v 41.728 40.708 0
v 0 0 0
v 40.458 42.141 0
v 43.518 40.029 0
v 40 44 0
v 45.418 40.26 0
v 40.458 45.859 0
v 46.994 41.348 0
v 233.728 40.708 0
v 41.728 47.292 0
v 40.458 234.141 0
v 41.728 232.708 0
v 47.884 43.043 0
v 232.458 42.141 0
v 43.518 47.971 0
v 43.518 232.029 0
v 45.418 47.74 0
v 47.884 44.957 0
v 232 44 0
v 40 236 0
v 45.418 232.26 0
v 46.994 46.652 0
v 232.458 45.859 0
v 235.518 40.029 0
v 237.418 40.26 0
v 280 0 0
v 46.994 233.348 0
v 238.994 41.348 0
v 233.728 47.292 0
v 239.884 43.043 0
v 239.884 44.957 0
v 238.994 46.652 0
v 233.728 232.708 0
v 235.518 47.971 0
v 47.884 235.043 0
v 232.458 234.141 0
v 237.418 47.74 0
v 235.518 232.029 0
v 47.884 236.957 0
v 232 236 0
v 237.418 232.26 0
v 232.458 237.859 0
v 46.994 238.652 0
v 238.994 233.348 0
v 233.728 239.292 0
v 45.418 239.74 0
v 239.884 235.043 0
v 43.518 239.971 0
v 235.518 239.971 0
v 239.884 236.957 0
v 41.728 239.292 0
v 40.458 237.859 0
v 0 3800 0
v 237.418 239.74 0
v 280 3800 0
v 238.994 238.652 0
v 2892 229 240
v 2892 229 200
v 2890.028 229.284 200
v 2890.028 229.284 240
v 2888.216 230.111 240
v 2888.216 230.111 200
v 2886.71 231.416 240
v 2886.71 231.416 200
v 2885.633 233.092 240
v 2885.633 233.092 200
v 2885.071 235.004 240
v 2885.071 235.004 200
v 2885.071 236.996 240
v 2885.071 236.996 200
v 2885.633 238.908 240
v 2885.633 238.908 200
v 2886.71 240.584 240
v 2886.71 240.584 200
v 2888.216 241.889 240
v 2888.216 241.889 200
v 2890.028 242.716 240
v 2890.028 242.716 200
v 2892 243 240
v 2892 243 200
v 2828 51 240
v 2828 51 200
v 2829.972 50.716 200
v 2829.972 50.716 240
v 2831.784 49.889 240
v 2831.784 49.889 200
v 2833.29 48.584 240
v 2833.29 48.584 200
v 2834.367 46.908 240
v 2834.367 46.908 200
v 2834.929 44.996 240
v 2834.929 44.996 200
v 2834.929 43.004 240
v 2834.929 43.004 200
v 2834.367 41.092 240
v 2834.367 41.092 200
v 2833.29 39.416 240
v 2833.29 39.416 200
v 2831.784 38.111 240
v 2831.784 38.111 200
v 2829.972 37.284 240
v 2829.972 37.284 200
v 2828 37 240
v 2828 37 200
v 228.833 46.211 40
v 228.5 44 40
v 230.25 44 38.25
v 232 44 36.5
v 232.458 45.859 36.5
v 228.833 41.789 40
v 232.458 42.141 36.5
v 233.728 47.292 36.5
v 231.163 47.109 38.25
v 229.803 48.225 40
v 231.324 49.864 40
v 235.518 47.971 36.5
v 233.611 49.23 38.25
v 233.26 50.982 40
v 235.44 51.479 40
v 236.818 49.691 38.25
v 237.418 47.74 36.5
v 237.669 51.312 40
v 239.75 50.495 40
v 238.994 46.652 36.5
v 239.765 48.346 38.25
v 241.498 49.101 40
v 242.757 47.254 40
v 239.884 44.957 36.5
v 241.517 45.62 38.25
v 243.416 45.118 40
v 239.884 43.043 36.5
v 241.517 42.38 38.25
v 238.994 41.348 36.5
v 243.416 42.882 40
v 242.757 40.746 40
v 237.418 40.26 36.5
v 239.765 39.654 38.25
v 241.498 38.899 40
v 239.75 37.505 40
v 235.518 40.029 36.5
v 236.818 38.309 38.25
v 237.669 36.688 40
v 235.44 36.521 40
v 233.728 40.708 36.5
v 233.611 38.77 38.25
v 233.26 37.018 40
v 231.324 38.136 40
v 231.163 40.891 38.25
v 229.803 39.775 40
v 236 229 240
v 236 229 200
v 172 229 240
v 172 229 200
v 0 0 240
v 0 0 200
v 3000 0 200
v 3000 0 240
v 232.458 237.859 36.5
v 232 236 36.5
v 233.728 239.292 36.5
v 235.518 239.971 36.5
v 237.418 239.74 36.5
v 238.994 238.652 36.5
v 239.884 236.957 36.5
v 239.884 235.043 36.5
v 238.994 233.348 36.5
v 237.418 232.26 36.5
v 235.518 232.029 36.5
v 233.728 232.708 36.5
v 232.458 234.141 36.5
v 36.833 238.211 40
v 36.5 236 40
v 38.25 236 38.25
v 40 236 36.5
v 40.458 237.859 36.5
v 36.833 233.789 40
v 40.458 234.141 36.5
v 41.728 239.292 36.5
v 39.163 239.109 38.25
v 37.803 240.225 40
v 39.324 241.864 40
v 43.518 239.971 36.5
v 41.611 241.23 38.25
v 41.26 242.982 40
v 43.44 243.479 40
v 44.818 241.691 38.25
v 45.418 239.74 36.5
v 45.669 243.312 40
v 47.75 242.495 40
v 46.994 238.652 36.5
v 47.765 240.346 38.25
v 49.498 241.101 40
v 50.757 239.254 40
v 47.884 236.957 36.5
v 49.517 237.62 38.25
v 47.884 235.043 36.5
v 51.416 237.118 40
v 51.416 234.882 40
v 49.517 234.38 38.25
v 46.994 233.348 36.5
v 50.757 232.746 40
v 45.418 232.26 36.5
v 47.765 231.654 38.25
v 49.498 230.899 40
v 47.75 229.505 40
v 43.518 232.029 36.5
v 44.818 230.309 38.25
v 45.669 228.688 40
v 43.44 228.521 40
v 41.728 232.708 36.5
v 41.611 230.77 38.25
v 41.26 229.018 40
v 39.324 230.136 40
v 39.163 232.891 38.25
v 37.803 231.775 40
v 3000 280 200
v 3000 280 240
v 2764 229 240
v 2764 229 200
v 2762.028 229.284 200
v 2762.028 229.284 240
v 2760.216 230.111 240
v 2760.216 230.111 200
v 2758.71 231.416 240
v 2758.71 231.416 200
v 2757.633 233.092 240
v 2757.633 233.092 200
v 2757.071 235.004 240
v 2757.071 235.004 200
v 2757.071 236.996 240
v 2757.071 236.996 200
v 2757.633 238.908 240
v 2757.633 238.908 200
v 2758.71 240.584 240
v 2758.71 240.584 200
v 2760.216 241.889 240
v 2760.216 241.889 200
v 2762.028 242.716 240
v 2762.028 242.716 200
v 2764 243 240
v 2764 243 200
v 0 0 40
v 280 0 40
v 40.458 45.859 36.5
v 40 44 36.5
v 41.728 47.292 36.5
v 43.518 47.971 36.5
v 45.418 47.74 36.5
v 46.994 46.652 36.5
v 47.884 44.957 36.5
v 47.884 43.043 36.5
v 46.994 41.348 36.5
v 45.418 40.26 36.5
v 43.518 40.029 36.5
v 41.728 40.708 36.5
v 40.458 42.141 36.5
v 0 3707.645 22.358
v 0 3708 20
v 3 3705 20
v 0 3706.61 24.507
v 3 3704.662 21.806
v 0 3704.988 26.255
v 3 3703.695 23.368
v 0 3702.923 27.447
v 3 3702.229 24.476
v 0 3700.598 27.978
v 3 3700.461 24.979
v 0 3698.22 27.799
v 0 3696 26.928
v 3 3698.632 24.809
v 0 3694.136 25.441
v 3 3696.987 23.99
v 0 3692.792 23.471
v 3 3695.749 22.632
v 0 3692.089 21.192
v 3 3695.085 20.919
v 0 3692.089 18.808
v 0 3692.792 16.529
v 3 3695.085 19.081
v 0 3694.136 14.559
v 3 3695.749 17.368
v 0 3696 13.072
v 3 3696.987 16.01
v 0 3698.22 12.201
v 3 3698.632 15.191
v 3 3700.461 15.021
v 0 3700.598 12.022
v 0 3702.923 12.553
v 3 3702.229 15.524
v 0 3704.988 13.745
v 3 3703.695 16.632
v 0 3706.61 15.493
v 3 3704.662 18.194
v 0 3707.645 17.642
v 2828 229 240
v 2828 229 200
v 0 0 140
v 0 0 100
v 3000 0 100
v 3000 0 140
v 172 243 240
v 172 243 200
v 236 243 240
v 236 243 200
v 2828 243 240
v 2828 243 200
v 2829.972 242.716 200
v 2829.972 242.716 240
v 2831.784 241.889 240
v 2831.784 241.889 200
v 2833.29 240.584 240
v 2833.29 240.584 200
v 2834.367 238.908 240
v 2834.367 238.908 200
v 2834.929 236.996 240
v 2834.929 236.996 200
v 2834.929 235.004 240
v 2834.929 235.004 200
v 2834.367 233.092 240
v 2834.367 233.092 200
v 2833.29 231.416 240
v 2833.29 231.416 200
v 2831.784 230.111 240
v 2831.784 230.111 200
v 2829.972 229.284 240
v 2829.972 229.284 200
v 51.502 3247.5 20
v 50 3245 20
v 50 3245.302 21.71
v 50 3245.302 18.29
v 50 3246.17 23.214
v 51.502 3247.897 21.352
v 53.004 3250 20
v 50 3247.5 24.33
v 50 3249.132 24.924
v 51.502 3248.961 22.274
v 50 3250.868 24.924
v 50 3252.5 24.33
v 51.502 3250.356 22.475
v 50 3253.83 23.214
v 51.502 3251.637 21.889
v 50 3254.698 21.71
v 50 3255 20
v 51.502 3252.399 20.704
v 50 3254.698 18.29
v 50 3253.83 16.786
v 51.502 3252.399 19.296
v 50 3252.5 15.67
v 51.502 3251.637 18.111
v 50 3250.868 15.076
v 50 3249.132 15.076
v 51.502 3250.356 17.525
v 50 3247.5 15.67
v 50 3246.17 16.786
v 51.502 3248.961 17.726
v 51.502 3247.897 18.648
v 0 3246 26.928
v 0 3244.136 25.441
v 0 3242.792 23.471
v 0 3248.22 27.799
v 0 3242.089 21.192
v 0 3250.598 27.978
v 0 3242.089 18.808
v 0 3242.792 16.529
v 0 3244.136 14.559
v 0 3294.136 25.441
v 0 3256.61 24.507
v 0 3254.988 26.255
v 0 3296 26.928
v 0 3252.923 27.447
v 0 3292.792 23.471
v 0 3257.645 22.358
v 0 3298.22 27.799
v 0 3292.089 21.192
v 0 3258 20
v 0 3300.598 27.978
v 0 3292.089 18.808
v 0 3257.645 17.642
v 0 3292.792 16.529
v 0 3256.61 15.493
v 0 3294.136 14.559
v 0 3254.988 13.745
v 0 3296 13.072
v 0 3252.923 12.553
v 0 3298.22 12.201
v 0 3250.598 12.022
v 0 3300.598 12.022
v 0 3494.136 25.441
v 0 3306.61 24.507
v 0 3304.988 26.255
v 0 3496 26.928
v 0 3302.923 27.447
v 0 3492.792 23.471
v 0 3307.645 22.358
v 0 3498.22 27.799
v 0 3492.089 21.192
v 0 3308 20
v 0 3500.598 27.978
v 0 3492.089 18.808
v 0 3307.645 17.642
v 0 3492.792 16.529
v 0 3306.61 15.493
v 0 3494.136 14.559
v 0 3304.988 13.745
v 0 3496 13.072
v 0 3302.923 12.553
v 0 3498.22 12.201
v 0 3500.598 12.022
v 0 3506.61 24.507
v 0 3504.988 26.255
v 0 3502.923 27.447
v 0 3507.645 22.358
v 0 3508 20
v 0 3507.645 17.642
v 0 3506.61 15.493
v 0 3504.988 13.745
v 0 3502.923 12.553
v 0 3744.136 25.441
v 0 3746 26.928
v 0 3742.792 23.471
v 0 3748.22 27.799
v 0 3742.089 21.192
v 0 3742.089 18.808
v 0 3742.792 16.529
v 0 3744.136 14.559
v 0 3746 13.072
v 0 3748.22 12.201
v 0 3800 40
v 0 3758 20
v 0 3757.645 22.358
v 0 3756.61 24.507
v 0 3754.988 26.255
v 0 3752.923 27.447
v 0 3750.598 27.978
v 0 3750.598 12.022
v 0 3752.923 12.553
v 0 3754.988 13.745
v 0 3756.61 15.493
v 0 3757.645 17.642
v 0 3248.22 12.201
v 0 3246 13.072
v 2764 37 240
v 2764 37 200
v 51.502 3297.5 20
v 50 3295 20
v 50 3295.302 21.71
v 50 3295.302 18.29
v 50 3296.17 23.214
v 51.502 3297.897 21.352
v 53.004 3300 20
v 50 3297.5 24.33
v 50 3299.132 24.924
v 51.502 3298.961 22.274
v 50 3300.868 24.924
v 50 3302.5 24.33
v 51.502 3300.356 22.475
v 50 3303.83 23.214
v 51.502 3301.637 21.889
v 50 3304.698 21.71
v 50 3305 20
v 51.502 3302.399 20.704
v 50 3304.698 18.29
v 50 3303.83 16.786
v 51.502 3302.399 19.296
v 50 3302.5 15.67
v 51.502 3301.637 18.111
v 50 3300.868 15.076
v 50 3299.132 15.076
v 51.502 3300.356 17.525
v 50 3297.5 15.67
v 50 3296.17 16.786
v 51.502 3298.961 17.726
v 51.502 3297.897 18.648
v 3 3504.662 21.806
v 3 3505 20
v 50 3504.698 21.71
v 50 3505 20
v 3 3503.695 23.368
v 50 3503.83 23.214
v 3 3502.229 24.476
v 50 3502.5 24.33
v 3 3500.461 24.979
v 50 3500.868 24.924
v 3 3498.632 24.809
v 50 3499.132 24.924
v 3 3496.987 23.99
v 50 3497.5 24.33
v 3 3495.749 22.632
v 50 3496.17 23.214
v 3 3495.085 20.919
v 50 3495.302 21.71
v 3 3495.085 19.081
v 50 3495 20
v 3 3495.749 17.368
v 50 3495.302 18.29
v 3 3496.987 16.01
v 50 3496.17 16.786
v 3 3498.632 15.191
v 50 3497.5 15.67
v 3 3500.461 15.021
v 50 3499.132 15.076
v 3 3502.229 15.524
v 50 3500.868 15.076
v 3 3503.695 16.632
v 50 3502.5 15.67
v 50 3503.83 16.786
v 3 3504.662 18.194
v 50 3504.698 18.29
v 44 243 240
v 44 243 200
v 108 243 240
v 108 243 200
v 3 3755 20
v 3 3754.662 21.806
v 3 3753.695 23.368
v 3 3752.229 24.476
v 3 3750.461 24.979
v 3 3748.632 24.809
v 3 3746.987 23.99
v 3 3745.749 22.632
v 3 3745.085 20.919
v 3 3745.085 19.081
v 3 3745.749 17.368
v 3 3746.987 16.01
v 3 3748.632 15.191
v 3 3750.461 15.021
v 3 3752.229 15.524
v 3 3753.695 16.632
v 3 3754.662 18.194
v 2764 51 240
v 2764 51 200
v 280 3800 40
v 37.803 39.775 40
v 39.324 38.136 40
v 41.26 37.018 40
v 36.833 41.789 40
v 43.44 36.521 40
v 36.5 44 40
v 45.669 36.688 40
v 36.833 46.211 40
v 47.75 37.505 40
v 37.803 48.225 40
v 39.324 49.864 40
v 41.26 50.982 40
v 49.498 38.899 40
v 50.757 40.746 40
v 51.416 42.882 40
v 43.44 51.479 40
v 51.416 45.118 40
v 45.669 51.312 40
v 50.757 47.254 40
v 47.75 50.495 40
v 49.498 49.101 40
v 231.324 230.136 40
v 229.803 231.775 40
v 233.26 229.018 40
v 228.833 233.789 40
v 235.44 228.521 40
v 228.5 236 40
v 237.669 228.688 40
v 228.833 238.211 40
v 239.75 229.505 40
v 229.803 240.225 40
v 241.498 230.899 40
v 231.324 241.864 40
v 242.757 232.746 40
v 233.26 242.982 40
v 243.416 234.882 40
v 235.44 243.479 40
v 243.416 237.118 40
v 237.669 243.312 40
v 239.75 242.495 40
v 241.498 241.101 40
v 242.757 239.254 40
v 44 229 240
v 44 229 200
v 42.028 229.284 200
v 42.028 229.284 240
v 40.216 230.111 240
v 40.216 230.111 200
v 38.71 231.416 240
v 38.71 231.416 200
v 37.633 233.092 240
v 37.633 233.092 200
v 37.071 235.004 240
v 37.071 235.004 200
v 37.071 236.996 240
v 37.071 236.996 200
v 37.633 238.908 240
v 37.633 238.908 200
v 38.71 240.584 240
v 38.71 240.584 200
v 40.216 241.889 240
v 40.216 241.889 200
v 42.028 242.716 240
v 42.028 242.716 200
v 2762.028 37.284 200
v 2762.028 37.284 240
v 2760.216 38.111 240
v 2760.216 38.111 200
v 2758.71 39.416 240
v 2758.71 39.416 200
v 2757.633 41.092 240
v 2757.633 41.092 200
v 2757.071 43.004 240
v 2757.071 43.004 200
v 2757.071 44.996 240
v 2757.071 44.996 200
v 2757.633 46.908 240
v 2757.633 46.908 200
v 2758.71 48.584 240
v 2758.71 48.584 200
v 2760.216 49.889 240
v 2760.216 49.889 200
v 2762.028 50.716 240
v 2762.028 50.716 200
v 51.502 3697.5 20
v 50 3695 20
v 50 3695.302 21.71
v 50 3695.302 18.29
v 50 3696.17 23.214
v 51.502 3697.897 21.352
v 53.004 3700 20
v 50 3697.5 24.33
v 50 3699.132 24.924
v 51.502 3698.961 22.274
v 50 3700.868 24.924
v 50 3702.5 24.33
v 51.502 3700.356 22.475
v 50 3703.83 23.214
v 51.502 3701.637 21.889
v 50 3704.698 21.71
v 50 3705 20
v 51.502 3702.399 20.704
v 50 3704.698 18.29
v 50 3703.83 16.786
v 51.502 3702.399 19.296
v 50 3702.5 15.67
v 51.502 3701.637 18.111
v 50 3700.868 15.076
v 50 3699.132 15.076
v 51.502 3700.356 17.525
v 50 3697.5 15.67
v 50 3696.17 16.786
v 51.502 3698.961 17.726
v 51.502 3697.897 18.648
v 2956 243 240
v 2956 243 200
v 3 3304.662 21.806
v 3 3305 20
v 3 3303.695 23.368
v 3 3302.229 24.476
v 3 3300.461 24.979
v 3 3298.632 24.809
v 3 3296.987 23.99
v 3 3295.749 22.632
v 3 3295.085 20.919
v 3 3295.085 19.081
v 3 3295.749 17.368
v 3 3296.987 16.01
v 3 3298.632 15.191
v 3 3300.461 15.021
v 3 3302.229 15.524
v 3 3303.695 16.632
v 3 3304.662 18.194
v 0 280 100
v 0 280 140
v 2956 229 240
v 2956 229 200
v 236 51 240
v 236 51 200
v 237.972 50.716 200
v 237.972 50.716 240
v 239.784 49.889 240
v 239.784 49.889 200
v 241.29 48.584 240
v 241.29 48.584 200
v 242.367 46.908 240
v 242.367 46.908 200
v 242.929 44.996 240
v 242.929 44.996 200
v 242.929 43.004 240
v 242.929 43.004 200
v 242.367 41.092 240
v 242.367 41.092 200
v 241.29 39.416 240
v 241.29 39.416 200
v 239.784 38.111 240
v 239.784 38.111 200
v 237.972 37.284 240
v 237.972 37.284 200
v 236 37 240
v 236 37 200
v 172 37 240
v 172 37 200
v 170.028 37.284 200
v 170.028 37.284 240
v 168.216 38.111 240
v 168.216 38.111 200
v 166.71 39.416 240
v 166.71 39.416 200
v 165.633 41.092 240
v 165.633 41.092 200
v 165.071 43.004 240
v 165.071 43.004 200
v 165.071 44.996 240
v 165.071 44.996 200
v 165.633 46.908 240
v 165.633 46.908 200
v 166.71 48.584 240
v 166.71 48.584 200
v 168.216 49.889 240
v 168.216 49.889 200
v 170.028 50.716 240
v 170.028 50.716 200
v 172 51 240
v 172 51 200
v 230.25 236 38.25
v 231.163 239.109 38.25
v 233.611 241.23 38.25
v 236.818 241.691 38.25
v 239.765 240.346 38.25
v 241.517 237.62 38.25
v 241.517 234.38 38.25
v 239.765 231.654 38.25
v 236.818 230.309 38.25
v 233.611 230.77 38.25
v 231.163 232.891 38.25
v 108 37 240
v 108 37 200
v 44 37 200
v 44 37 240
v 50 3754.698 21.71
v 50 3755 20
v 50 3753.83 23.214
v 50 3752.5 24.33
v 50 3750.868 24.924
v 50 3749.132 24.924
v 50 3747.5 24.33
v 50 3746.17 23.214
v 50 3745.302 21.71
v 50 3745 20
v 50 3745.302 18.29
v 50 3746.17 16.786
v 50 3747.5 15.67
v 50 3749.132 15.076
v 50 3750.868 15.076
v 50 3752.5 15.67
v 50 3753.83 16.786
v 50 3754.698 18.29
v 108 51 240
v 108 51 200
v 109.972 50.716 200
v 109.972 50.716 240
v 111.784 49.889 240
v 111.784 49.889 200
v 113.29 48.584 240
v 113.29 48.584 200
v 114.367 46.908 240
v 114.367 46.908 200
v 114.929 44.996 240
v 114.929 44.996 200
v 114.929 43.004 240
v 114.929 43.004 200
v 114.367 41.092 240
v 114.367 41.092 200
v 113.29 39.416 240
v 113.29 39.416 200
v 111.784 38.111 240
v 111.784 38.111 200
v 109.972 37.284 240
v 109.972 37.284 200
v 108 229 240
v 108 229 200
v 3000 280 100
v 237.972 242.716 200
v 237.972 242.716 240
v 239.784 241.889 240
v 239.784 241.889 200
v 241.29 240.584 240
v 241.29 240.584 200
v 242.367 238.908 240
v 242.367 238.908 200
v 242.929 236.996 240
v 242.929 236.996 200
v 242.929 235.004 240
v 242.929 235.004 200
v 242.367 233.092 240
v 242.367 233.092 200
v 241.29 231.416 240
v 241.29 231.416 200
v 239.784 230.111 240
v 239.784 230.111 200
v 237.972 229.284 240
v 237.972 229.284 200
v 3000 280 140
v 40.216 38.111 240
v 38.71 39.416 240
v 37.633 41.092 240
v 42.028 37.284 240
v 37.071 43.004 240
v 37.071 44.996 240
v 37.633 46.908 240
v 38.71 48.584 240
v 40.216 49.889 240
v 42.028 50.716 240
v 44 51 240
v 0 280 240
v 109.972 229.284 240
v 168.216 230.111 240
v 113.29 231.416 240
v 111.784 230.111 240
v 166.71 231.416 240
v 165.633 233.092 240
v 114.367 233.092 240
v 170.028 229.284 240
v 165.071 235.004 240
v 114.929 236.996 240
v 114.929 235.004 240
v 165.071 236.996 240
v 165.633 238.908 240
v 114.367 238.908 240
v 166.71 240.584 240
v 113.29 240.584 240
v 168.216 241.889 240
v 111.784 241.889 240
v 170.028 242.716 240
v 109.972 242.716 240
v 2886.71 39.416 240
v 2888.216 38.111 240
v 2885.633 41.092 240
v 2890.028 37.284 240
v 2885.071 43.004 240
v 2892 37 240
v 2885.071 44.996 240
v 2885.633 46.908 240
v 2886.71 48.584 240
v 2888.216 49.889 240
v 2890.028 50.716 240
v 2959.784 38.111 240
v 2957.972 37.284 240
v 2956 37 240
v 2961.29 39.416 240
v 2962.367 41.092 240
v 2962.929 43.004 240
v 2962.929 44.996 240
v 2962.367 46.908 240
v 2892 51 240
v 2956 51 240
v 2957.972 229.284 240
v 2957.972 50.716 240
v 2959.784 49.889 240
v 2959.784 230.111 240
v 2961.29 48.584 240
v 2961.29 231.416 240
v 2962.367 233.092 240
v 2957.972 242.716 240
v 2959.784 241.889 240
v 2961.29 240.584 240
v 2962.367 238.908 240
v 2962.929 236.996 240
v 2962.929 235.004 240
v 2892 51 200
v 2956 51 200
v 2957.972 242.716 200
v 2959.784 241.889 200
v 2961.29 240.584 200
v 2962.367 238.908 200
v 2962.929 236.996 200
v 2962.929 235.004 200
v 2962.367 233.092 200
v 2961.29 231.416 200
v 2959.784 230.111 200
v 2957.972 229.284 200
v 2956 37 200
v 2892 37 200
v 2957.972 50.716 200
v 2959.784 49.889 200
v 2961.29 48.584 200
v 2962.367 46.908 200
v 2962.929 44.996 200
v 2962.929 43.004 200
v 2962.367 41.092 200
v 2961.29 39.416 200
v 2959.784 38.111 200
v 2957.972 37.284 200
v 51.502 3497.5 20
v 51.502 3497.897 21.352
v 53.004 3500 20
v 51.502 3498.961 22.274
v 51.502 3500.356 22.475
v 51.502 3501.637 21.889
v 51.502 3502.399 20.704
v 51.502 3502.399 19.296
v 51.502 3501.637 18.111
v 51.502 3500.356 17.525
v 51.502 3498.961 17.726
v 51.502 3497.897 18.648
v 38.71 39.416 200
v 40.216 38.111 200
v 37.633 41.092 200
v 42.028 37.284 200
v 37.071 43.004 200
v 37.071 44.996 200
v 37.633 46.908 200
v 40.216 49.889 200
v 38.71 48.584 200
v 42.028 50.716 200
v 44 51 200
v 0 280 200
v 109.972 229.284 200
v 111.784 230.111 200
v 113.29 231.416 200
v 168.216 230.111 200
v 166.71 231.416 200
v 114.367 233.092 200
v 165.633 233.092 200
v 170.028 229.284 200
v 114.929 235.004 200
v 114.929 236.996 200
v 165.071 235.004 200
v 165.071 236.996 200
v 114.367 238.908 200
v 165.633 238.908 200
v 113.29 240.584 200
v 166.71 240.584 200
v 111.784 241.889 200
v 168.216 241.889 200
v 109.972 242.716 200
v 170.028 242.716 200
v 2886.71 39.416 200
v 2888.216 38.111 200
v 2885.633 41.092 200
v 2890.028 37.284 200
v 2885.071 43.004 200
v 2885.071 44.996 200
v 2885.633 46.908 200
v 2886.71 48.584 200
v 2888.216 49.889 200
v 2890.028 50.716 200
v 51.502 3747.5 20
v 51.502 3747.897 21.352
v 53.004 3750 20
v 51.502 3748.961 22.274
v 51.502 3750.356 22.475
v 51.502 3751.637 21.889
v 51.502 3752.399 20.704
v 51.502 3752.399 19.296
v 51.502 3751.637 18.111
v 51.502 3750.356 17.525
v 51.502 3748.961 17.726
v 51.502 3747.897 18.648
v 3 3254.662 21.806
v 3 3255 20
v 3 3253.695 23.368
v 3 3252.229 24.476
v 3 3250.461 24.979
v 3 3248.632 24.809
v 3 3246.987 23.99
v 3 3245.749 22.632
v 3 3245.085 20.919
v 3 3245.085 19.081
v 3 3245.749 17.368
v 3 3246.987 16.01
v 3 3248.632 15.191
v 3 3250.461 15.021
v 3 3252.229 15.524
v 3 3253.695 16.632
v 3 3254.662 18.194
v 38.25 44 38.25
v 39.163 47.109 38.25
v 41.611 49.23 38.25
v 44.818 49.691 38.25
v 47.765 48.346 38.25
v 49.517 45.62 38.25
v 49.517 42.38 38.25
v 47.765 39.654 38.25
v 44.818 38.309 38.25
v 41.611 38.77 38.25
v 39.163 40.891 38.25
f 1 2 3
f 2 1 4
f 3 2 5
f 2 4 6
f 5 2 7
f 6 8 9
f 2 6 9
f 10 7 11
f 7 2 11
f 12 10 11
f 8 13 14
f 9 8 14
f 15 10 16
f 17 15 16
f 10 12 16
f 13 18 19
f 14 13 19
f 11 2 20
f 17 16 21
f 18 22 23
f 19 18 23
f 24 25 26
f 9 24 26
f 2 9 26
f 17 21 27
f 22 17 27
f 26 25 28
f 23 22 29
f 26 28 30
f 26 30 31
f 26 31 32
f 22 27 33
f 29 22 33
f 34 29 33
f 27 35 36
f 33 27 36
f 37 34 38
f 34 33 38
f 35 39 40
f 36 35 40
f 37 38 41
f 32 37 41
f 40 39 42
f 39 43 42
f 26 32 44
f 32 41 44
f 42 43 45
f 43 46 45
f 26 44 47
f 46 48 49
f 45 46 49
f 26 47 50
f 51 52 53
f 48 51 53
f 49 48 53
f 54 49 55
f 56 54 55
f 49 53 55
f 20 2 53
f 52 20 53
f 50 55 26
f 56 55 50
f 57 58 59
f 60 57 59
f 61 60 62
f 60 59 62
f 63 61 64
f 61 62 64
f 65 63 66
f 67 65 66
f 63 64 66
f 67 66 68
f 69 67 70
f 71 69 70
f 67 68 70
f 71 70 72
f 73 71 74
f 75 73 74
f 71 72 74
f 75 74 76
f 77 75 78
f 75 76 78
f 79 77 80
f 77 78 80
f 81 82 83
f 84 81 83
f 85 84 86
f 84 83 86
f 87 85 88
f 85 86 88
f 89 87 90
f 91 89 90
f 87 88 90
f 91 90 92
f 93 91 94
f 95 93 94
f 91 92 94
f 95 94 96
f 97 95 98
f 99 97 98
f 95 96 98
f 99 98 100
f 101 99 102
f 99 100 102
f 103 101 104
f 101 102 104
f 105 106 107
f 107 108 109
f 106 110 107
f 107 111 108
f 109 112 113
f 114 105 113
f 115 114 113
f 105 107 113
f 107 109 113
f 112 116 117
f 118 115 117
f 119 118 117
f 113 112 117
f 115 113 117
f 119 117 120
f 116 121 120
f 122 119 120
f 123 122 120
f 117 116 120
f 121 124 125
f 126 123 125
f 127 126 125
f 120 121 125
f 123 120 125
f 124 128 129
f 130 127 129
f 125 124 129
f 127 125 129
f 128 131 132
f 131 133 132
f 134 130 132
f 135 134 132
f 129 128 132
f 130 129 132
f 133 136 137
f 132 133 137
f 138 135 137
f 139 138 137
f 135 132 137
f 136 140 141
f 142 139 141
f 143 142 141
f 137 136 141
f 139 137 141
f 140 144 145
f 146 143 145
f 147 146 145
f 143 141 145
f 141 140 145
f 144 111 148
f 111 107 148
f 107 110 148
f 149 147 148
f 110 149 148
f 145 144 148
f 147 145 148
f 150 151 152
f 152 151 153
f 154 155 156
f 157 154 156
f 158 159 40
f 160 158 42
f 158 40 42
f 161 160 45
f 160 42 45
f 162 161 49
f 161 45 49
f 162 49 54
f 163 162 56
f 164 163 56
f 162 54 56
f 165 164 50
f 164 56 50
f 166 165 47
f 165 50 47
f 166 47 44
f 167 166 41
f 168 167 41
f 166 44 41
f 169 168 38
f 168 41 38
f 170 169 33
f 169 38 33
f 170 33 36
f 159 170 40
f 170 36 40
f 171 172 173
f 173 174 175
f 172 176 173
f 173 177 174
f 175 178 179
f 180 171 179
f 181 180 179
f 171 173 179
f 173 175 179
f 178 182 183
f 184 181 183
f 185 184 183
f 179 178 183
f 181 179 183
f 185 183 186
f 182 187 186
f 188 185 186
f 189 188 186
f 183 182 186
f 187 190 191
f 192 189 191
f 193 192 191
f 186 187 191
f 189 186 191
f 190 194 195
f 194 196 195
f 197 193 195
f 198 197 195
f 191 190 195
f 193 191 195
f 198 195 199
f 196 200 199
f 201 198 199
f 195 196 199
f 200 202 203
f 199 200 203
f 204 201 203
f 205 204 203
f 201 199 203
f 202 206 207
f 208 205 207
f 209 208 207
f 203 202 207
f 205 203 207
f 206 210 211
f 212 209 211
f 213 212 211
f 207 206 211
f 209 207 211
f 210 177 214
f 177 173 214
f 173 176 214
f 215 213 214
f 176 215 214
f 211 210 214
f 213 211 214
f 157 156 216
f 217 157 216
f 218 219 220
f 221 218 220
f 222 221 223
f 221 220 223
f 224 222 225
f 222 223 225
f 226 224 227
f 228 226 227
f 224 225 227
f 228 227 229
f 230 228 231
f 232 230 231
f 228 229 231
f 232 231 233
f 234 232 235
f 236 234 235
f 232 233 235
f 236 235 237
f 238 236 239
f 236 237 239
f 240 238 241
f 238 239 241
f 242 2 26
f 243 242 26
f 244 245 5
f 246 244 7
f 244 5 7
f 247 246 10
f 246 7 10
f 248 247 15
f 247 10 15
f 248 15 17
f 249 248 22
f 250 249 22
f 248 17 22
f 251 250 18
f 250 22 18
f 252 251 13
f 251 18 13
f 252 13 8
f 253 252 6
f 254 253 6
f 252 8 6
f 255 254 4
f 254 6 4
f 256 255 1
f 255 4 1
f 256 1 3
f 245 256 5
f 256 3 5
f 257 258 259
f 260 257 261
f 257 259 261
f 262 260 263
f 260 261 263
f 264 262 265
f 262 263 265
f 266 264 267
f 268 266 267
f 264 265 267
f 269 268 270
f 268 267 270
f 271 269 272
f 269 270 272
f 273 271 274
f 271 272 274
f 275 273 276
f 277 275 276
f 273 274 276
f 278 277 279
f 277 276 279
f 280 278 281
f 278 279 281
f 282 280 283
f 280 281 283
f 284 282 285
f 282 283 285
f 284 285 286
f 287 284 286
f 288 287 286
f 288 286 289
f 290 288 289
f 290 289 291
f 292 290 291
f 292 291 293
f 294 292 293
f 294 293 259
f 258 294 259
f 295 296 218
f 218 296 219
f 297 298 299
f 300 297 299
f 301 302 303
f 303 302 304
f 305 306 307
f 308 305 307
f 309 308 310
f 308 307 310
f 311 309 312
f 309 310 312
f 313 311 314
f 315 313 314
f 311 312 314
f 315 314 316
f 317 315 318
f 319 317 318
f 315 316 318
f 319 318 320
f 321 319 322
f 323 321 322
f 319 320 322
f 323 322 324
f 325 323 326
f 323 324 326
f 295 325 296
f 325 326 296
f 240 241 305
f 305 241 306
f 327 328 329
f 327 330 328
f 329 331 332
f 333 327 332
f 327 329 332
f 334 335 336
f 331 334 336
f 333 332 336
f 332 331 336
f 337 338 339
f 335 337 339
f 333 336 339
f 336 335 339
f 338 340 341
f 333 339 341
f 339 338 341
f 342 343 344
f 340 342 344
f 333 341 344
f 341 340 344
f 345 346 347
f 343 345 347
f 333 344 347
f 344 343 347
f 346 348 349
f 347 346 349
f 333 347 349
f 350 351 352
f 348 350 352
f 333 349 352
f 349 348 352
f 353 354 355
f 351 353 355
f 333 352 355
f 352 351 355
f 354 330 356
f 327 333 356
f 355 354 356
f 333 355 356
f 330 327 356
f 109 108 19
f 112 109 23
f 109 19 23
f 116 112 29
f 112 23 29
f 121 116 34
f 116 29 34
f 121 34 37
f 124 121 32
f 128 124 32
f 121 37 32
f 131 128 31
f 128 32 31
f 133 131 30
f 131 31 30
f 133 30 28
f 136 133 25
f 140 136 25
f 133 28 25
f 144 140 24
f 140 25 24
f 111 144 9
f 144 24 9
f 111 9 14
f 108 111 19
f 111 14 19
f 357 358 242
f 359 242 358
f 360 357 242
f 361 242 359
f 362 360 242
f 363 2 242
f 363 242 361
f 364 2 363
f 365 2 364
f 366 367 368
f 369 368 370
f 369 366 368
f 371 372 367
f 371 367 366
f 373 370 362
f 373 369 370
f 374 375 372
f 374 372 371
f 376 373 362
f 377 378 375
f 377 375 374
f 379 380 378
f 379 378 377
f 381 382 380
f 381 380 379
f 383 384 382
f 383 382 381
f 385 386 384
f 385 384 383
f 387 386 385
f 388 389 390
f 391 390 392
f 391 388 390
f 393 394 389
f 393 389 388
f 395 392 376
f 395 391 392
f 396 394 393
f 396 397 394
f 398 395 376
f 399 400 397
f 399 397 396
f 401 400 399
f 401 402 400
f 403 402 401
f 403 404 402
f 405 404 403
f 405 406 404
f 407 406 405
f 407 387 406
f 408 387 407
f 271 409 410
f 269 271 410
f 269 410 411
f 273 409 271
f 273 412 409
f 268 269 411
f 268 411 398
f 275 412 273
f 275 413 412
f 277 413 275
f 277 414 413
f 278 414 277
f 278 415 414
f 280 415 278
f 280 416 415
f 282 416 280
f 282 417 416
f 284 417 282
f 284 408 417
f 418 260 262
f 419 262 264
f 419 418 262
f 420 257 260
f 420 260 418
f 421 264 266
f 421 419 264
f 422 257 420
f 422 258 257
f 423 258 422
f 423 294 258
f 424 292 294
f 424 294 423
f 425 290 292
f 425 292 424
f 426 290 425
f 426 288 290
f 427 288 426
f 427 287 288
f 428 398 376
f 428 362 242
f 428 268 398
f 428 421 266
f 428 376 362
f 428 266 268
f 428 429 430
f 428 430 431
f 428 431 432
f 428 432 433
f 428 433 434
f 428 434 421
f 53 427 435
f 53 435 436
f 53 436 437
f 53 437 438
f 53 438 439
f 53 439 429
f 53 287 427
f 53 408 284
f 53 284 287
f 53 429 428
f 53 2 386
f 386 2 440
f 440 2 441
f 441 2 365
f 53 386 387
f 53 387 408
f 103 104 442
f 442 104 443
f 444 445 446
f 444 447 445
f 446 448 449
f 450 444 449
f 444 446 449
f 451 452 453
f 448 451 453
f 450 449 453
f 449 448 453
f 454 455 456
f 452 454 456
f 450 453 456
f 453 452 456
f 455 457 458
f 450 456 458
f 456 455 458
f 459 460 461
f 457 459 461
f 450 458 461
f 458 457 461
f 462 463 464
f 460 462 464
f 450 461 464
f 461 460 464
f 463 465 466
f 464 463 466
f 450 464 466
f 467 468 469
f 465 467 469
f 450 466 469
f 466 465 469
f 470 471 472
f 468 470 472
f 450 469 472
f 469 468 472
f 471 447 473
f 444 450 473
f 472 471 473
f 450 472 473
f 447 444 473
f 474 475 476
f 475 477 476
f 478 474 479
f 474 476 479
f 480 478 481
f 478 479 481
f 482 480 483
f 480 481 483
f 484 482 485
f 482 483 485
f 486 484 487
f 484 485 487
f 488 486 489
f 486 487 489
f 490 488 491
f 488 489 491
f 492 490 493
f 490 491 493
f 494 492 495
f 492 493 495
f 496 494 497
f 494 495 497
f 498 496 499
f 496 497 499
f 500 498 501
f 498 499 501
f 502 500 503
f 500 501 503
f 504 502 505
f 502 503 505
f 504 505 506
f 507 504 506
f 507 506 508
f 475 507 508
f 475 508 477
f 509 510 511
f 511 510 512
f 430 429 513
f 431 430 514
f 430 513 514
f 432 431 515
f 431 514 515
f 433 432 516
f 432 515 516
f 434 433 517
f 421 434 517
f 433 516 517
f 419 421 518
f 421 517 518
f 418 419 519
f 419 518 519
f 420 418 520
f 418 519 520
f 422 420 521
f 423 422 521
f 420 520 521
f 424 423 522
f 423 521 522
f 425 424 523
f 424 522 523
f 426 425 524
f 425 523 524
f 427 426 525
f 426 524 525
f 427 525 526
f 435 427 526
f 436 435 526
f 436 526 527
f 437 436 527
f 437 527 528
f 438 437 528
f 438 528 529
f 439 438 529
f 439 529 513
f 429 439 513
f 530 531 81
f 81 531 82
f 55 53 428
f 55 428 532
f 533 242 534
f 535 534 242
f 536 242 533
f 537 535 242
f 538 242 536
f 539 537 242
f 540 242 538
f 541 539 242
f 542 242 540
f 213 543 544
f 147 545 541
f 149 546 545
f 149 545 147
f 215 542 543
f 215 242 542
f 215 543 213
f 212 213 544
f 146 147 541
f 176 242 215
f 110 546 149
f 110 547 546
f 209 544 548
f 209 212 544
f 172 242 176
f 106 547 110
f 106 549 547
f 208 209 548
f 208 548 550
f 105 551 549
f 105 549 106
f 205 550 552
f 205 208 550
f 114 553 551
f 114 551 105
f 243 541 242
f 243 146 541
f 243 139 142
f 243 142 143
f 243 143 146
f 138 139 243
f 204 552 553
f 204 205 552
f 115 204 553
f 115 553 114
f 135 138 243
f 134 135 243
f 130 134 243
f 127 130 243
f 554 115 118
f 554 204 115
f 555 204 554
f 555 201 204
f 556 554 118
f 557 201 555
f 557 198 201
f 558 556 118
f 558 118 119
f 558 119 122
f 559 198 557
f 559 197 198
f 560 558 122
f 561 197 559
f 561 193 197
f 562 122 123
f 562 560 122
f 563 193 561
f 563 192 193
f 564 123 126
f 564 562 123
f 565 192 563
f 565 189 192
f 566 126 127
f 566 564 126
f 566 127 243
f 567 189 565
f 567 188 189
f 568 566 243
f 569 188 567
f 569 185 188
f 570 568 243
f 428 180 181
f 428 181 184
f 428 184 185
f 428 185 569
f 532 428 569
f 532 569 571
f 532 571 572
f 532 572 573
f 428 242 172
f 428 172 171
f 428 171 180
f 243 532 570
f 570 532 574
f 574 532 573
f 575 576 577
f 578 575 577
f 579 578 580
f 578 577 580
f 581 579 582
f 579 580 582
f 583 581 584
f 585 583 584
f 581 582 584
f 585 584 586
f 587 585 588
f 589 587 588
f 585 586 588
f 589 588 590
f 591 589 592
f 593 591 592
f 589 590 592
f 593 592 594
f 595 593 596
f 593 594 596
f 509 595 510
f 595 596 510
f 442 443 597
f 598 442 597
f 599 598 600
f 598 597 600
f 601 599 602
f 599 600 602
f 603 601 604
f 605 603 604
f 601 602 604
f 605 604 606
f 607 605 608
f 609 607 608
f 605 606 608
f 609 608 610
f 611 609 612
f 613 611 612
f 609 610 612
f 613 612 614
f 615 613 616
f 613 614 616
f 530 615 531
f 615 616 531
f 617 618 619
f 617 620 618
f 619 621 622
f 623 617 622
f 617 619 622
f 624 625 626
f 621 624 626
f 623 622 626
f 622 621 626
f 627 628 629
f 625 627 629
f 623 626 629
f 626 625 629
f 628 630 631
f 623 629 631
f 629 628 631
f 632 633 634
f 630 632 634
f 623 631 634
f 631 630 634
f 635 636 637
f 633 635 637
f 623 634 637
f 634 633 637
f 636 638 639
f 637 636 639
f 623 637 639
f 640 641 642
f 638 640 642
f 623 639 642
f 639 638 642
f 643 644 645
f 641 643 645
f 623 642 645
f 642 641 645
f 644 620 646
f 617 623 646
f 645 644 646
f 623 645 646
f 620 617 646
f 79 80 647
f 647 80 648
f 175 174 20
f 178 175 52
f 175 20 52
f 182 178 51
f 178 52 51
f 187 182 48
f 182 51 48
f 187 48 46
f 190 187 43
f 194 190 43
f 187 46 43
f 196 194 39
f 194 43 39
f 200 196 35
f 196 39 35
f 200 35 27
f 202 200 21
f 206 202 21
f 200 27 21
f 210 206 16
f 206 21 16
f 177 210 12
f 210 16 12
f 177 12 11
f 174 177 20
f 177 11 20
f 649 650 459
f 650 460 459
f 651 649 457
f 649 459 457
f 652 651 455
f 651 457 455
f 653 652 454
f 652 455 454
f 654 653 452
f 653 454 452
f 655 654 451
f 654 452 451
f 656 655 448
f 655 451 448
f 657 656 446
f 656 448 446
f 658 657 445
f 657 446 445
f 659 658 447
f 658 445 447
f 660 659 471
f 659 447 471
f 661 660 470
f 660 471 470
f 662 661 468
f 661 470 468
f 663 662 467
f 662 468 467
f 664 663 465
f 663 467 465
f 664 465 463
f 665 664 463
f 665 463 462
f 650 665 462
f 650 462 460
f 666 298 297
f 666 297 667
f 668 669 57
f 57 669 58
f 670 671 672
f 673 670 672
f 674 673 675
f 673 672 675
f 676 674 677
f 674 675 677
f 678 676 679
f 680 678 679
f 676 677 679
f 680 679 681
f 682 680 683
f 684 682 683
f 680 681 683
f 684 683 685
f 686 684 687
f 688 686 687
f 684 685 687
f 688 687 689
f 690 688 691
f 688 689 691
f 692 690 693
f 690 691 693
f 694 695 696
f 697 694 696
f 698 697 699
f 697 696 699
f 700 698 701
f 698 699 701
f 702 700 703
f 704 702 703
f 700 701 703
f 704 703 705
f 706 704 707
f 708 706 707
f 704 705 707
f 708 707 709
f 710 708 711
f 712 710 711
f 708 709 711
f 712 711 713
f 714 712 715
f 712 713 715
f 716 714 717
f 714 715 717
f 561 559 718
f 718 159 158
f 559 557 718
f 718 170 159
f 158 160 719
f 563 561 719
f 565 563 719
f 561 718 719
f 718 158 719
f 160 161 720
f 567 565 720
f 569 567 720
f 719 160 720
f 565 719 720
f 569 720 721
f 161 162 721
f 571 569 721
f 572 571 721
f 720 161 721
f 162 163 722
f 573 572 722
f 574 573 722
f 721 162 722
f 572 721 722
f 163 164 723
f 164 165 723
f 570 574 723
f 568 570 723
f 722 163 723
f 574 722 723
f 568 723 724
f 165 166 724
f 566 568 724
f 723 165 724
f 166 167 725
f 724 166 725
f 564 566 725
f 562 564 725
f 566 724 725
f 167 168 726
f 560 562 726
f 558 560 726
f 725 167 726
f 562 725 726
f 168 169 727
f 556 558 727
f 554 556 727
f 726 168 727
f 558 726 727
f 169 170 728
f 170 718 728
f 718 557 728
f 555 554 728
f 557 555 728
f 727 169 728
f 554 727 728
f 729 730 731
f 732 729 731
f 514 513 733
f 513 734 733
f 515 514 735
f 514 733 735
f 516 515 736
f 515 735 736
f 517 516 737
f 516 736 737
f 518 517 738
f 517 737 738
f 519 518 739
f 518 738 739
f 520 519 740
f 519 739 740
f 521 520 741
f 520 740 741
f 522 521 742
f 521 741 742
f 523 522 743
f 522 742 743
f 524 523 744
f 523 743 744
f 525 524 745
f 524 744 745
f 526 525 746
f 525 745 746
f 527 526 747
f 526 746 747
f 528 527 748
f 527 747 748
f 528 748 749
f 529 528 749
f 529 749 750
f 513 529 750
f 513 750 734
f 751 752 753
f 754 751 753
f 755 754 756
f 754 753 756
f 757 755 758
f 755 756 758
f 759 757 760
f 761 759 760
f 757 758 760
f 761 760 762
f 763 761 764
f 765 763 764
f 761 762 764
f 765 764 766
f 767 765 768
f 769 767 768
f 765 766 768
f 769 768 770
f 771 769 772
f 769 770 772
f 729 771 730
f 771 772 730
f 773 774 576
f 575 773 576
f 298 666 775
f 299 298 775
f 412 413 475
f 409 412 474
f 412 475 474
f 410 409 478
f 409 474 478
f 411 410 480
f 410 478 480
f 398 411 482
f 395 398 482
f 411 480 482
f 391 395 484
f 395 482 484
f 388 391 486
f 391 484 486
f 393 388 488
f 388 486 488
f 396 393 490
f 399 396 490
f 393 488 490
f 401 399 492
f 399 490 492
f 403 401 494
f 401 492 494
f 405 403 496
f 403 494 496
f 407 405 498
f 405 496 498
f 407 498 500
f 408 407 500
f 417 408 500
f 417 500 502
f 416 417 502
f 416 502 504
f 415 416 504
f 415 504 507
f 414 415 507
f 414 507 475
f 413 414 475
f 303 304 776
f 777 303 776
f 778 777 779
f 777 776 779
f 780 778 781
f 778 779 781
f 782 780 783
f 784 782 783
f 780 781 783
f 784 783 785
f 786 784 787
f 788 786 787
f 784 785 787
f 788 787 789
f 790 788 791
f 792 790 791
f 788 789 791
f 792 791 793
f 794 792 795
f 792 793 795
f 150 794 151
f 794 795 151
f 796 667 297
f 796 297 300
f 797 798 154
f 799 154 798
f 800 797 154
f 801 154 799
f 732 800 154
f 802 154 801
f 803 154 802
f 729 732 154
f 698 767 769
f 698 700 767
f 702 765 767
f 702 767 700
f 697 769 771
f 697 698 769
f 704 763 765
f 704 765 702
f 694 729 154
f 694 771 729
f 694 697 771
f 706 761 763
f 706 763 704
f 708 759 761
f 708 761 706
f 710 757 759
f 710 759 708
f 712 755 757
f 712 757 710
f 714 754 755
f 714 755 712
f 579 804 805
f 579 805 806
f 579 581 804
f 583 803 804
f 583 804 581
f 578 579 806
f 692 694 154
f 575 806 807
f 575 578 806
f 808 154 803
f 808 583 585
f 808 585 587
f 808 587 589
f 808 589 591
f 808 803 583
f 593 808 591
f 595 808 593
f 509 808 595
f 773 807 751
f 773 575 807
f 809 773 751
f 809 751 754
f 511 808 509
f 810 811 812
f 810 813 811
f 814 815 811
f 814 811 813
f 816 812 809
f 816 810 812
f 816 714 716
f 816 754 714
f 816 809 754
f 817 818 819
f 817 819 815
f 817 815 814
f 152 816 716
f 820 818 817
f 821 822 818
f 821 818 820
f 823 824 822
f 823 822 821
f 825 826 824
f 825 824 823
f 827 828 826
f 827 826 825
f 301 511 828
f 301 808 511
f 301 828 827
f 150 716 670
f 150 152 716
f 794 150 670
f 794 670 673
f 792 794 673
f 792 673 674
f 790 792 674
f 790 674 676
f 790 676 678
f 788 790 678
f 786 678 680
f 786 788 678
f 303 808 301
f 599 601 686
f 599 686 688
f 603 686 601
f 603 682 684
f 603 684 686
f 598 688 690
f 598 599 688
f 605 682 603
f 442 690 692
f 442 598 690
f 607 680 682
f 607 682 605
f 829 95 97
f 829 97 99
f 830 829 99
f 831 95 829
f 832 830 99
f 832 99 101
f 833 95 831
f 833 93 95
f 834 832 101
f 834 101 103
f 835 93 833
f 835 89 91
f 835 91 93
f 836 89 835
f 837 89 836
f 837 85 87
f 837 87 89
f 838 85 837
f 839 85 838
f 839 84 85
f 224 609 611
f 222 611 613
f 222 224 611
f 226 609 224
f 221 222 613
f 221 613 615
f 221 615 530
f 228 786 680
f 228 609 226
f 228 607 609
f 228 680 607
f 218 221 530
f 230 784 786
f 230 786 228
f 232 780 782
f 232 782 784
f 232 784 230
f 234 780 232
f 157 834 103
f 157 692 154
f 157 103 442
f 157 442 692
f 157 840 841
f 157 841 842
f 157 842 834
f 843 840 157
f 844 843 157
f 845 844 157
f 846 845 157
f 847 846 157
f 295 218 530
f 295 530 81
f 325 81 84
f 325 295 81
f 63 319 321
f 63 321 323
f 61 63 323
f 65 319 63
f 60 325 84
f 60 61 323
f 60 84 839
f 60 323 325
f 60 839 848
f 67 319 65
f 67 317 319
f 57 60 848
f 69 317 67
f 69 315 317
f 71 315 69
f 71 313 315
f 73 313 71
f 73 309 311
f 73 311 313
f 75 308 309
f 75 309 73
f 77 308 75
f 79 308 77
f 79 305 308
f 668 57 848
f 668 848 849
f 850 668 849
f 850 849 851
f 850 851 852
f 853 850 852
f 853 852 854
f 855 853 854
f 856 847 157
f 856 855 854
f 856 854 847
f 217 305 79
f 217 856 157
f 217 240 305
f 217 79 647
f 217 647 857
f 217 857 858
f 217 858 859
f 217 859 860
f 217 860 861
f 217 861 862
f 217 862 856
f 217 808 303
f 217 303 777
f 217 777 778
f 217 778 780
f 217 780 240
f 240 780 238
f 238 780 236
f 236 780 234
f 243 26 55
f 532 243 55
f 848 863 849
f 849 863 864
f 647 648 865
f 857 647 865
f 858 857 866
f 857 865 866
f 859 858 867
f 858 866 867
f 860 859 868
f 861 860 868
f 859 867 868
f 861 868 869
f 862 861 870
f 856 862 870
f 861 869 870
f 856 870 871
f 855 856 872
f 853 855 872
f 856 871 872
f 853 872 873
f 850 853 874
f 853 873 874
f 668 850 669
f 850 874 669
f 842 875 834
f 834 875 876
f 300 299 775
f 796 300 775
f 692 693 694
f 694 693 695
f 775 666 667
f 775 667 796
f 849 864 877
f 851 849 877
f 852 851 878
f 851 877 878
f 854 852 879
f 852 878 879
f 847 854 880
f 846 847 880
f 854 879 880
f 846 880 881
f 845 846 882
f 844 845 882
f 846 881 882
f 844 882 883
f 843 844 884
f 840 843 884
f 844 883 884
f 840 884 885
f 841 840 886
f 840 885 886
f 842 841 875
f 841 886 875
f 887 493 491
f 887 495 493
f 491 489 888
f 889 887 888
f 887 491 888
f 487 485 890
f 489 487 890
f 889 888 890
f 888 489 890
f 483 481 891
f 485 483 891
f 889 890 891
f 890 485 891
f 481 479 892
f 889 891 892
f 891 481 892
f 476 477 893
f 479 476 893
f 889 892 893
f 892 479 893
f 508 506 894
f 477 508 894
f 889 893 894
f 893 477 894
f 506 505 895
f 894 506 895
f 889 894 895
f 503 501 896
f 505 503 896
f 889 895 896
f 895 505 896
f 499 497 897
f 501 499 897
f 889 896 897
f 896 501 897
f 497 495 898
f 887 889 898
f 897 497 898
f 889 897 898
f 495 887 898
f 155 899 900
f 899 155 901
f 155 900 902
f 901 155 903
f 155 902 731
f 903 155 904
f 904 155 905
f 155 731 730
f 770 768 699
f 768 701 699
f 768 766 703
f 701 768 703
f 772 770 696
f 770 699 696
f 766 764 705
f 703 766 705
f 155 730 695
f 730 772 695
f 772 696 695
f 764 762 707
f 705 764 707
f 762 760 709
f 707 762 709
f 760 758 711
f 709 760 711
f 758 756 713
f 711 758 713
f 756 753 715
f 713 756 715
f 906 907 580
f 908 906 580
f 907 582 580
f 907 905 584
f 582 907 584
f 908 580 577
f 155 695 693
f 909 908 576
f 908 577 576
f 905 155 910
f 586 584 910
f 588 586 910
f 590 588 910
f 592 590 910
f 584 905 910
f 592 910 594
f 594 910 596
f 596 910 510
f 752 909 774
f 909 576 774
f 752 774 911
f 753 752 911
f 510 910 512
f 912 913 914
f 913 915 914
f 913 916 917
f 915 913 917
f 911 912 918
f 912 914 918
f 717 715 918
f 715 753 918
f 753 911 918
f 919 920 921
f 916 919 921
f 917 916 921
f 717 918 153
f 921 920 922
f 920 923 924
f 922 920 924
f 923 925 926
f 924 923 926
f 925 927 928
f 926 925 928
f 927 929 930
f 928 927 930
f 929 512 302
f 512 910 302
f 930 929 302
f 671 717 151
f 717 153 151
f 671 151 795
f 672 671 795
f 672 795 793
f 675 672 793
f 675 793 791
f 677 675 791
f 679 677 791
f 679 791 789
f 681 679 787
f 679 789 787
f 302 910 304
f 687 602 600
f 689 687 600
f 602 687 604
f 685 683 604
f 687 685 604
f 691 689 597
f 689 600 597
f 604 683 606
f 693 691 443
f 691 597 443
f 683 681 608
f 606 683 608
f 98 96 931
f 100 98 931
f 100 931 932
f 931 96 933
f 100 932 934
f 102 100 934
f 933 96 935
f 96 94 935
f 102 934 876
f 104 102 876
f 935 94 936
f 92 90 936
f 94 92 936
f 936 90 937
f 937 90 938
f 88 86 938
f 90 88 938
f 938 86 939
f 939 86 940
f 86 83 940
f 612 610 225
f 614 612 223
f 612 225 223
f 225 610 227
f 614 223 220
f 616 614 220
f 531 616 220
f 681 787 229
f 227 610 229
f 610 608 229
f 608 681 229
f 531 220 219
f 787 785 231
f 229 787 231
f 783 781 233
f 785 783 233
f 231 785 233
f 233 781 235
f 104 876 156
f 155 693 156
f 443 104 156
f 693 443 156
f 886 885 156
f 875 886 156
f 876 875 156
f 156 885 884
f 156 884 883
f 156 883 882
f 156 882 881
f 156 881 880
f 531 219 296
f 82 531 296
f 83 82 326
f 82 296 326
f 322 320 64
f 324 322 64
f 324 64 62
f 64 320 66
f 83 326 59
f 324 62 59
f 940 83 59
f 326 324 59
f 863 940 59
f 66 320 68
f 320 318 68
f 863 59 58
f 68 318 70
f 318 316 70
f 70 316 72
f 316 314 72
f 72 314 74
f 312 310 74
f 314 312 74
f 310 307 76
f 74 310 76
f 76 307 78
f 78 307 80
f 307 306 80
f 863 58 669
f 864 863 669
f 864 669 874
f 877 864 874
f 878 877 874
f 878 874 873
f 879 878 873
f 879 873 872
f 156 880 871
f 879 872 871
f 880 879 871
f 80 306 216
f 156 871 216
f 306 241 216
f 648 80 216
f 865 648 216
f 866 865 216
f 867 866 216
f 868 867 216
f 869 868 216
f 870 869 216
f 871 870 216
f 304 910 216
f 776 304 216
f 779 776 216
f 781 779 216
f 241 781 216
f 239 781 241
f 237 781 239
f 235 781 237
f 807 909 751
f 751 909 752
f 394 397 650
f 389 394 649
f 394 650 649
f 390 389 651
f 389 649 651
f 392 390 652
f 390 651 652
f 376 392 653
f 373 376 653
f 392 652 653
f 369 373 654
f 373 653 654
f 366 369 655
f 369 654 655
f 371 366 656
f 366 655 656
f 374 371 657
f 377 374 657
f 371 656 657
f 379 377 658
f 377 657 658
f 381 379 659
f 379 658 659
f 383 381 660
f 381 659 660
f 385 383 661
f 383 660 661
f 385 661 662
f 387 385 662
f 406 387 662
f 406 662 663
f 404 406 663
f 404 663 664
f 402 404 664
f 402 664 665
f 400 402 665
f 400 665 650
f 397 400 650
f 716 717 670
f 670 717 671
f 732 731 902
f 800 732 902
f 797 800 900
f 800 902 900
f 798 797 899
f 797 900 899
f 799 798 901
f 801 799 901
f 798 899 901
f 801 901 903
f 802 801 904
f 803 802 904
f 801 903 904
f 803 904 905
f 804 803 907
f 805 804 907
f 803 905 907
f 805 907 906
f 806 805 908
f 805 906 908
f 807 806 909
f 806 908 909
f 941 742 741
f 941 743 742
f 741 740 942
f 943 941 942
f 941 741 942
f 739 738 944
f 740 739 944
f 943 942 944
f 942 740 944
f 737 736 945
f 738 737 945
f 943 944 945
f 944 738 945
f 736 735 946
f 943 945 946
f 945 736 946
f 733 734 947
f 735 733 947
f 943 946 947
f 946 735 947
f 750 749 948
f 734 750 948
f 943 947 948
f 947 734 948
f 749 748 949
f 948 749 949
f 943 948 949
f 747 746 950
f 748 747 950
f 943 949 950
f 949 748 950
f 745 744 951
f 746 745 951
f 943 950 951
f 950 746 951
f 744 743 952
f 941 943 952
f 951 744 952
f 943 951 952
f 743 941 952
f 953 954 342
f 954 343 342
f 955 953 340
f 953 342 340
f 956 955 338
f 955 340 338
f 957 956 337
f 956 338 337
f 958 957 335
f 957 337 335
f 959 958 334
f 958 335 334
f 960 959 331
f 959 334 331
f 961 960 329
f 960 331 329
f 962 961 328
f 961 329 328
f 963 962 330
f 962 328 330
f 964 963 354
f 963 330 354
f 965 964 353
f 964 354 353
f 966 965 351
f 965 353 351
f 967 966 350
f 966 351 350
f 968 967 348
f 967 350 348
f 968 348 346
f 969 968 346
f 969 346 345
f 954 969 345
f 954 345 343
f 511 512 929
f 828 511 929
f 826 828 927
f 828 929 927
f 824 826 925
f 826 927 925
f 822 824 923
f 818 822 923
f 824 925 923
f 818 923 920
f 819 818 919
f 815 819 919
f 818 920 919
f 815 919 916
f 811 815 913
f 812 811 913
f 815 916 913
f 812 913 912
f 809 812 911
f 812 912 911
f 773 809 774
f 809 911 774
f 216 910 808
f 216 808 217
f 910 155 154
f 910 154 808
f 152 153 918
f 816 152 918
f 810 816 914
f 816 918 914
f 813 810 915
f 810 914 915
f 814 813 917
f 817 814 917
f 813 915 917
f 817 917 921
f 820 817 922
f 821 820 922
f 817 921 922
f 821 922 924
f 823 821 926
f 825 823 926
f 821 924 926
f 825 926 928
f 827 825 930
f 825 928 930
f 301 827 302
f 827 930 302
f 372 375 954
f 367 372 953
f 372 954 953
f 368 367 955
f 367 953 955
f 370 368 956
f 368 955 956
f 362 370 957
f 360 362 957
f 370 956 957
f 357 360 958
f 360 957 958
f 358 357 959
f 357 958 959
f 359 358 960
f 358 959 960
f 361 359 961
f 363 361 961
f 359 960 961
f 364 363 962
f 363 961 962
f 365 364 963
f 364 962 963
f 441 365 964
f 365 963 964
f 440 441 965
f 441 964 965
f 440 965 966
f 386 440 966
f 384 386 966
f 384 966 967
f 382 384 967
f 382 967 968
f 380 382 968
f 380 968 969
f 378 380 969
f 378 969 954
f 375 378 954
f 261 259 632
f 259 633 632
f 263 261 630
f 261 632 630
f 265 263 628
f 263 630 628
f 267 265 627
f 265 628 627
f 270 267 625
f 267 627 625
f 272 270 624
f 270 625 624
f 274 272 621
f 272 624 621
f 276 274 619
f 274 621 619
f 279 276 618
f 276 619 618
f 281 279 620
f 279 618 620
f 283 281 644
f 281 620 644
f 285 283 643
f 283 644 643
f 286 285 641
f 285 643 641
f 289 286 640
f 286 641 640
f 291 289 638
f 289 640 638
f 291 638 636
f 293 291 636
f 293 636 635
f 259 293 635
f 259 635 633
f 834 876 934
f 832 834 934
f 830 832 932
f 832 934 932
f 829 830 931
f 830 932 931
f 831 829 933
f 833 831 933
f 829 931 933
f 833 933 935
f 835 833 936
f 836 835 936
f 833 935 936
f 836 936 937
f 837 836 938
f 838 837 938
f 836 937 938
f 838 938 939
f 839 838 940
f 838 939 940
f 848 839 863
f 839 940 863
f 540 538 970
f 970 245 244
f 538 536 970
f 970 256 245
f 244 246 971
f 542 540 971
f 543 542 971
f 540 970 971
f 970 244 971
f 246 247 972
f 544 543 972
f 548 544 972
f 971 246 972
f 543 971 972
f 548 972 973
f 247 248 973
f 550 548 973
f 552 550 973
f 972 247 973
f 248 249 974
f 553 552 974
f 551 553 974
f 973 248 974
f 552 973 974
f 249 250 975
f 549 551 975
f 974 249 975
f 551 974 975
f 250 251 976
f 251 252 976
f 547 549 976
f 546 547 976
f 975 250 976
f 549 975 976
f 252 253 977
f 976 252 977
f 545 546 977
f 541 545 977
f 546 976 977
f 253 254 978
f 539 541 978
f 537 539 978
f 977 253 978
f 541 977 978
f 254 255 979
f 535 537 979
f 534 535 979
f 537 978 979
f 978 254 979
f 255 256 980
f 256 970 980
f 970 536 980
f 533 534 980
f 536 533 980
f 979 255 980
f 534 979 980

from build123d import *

# Parameters (mm, degrees)
F0_W            = 280
F0_H            = 3800
F1_DEPTH        = 40
F3_W            = 3000
F3_H            = 280
F4_DEPTH        = 40
F6_W            = 3000
F6_H            = 280
F7_DEPTH        = 40
F8_D            = 8
F8_START        = 160
F8_CSINK_D      = 15
F8_CSINK_ANGLE  = 90
F10_D           = 10
F10_DEPTH       = 50
F10_CSINK_D     = 16
F10_CSINK_ANGLE = 90
F10_TIP         = 3.0043030951


with BuildPart() as f1:
    # F0 (on Top) → F1 (new body)
    with BuildSketch(Plane.XY):
        with Locations((140, 1900)):
            Rectangle(F0_W, F0_H)
    extrude(amount=F1_DEPTH)

    # F8 (through all)
    # its depths count from where the whole tool has entered the part; down to there all is cleared
    with Locations(Plane.XY.offset(200).offset(-F8_START)):
        with Locations((44, 236), (236, 236), (236, 44), (44, 44)):
            CounterSinkHole(F8_D / 2, F8_CSINK_D / 2, counter_sink_angle=F8_CSINK_ANGLE)

    # F10
    with Locations(Plane(origin=(0, 0, 0), x_dir=(0, -1, 0), z_dir=(-1, 0, 0))):
        with Locations((-3750, 20), (-3700, 20), (-3500, 20), (-3300, 20), (-3250, 20)):
            CounterSinkHole(F10_D / 2, F10_CSINK_D / 2, depth=F10_DEPTH, counter_sink_angle=F10_CSINK_ANGLE)
            with Locations((0, 0, -(F10_DEPTH + F10_TIP / 2))):  # 118° drill point
                Cone(0, F10_D / 2, F10_TIP, mode=Mode.SUBTRACT)


with BuildPart() as f4:
    # F3 (on offset) → F4 (new body)
    with BuildSketch(Plane.XY.offset(100)):
        with Locations((1500, 140)):
            Rectangle(F3_W, F3_H)
    extrude(amount=F4_DEPTH)


with BuildPart() as f7:
    # F6 (on offset) → F7 (new body)
    with BuildSketch(Plane.XY.offset(200)):
        with Locations((1500, 140)):
            Rectangle(F6_W, F6_H)
        with BuildLine():
            ThreePointArc((44, 37), (37, 44), (44, 51))
            Line((44, 51), (108, 51))
            ThreePointArc((108, 51), (115, 44), (108, 37))
            Line((108, 37), (44, 37))
        make_face(mode=Mode.SUBTRACT)
        with BuildLine():
            Line((236, 37), (172, 37))
            ThreePointArc((172, 37), (165, 44), (172, 51))
            Line((172, 51), (236, 51))
            ThreePointArc((236, 51), (243, 44), (236, 37))
        make_face(mode=Mode.SUBTRACT)
        with BuildLine():
            ThreePointArc((2828, 51), (2835, 44), (2828, 37))
            Line((2828, 37), (2764, 37))
            ThreePointArc((2764, 37), (2757, 44), (2764, 51))
            Line((2764, 51), (2828, 51))
        make_face(mode=Mode.SUBTRACT)
        with BuildLine():
            Line((2892, 51), (2956, 51))
            ThreePointArc((2956, 51), (2963, 44), (2956, 37))
            Line((2956, 37), (2892, 37))
            ThreePointArc((2892, 37), (2885, 44), (2892, 51))
        make_face(mode=Mode.SUBTRACT)
        with BuildLine():
            Line((108, 229), (44, 229))
            ThreePointArc((44, 229), (37, 236), (44, 243))
            Line((44, 243), (108, 243))
            ThreePointArc((108, 243), (115, 236), (108, 229))
        make_face(mode=Mode.SUBTRACT)
        with BuildLine():
            ThreePointArc((236, 243), (243, 236), (236, 229))
            Line((236, 229), (172, 229))
            ThreePointArc((172, 229), (165, 236), (172, 243))
            Line((172, 243), (236, 243))
        make_face(mode=Mode.SUBTRACT)
        with BuildLine():
            Line((2828, 229), (2764, 229))
            ThreePointArc((2764, 229), (2757, 236), (2764, 243))
            Line((2764, 243), (2828, 243))
            ThreePointArc((2828, 243), (2835, 236), (2828, 229))
        make_face(mode=Mode.SUBTRACT)
        with BuildLine():
            ThreePointArc((2892, 229), (2885, 236), (2892, 243))
            Line((2892, 243), (2956, 243))
            ThreePointArc((2956, 243), (2963, 236), (2956, 229))
            Line((2956, 229), (2892, 229))
        make_face(mode=Mode.SUBTRACT)
    extrude(amount=F7_DEPTH)


solid = Compound([f1.part, f4.part, f7.part])
